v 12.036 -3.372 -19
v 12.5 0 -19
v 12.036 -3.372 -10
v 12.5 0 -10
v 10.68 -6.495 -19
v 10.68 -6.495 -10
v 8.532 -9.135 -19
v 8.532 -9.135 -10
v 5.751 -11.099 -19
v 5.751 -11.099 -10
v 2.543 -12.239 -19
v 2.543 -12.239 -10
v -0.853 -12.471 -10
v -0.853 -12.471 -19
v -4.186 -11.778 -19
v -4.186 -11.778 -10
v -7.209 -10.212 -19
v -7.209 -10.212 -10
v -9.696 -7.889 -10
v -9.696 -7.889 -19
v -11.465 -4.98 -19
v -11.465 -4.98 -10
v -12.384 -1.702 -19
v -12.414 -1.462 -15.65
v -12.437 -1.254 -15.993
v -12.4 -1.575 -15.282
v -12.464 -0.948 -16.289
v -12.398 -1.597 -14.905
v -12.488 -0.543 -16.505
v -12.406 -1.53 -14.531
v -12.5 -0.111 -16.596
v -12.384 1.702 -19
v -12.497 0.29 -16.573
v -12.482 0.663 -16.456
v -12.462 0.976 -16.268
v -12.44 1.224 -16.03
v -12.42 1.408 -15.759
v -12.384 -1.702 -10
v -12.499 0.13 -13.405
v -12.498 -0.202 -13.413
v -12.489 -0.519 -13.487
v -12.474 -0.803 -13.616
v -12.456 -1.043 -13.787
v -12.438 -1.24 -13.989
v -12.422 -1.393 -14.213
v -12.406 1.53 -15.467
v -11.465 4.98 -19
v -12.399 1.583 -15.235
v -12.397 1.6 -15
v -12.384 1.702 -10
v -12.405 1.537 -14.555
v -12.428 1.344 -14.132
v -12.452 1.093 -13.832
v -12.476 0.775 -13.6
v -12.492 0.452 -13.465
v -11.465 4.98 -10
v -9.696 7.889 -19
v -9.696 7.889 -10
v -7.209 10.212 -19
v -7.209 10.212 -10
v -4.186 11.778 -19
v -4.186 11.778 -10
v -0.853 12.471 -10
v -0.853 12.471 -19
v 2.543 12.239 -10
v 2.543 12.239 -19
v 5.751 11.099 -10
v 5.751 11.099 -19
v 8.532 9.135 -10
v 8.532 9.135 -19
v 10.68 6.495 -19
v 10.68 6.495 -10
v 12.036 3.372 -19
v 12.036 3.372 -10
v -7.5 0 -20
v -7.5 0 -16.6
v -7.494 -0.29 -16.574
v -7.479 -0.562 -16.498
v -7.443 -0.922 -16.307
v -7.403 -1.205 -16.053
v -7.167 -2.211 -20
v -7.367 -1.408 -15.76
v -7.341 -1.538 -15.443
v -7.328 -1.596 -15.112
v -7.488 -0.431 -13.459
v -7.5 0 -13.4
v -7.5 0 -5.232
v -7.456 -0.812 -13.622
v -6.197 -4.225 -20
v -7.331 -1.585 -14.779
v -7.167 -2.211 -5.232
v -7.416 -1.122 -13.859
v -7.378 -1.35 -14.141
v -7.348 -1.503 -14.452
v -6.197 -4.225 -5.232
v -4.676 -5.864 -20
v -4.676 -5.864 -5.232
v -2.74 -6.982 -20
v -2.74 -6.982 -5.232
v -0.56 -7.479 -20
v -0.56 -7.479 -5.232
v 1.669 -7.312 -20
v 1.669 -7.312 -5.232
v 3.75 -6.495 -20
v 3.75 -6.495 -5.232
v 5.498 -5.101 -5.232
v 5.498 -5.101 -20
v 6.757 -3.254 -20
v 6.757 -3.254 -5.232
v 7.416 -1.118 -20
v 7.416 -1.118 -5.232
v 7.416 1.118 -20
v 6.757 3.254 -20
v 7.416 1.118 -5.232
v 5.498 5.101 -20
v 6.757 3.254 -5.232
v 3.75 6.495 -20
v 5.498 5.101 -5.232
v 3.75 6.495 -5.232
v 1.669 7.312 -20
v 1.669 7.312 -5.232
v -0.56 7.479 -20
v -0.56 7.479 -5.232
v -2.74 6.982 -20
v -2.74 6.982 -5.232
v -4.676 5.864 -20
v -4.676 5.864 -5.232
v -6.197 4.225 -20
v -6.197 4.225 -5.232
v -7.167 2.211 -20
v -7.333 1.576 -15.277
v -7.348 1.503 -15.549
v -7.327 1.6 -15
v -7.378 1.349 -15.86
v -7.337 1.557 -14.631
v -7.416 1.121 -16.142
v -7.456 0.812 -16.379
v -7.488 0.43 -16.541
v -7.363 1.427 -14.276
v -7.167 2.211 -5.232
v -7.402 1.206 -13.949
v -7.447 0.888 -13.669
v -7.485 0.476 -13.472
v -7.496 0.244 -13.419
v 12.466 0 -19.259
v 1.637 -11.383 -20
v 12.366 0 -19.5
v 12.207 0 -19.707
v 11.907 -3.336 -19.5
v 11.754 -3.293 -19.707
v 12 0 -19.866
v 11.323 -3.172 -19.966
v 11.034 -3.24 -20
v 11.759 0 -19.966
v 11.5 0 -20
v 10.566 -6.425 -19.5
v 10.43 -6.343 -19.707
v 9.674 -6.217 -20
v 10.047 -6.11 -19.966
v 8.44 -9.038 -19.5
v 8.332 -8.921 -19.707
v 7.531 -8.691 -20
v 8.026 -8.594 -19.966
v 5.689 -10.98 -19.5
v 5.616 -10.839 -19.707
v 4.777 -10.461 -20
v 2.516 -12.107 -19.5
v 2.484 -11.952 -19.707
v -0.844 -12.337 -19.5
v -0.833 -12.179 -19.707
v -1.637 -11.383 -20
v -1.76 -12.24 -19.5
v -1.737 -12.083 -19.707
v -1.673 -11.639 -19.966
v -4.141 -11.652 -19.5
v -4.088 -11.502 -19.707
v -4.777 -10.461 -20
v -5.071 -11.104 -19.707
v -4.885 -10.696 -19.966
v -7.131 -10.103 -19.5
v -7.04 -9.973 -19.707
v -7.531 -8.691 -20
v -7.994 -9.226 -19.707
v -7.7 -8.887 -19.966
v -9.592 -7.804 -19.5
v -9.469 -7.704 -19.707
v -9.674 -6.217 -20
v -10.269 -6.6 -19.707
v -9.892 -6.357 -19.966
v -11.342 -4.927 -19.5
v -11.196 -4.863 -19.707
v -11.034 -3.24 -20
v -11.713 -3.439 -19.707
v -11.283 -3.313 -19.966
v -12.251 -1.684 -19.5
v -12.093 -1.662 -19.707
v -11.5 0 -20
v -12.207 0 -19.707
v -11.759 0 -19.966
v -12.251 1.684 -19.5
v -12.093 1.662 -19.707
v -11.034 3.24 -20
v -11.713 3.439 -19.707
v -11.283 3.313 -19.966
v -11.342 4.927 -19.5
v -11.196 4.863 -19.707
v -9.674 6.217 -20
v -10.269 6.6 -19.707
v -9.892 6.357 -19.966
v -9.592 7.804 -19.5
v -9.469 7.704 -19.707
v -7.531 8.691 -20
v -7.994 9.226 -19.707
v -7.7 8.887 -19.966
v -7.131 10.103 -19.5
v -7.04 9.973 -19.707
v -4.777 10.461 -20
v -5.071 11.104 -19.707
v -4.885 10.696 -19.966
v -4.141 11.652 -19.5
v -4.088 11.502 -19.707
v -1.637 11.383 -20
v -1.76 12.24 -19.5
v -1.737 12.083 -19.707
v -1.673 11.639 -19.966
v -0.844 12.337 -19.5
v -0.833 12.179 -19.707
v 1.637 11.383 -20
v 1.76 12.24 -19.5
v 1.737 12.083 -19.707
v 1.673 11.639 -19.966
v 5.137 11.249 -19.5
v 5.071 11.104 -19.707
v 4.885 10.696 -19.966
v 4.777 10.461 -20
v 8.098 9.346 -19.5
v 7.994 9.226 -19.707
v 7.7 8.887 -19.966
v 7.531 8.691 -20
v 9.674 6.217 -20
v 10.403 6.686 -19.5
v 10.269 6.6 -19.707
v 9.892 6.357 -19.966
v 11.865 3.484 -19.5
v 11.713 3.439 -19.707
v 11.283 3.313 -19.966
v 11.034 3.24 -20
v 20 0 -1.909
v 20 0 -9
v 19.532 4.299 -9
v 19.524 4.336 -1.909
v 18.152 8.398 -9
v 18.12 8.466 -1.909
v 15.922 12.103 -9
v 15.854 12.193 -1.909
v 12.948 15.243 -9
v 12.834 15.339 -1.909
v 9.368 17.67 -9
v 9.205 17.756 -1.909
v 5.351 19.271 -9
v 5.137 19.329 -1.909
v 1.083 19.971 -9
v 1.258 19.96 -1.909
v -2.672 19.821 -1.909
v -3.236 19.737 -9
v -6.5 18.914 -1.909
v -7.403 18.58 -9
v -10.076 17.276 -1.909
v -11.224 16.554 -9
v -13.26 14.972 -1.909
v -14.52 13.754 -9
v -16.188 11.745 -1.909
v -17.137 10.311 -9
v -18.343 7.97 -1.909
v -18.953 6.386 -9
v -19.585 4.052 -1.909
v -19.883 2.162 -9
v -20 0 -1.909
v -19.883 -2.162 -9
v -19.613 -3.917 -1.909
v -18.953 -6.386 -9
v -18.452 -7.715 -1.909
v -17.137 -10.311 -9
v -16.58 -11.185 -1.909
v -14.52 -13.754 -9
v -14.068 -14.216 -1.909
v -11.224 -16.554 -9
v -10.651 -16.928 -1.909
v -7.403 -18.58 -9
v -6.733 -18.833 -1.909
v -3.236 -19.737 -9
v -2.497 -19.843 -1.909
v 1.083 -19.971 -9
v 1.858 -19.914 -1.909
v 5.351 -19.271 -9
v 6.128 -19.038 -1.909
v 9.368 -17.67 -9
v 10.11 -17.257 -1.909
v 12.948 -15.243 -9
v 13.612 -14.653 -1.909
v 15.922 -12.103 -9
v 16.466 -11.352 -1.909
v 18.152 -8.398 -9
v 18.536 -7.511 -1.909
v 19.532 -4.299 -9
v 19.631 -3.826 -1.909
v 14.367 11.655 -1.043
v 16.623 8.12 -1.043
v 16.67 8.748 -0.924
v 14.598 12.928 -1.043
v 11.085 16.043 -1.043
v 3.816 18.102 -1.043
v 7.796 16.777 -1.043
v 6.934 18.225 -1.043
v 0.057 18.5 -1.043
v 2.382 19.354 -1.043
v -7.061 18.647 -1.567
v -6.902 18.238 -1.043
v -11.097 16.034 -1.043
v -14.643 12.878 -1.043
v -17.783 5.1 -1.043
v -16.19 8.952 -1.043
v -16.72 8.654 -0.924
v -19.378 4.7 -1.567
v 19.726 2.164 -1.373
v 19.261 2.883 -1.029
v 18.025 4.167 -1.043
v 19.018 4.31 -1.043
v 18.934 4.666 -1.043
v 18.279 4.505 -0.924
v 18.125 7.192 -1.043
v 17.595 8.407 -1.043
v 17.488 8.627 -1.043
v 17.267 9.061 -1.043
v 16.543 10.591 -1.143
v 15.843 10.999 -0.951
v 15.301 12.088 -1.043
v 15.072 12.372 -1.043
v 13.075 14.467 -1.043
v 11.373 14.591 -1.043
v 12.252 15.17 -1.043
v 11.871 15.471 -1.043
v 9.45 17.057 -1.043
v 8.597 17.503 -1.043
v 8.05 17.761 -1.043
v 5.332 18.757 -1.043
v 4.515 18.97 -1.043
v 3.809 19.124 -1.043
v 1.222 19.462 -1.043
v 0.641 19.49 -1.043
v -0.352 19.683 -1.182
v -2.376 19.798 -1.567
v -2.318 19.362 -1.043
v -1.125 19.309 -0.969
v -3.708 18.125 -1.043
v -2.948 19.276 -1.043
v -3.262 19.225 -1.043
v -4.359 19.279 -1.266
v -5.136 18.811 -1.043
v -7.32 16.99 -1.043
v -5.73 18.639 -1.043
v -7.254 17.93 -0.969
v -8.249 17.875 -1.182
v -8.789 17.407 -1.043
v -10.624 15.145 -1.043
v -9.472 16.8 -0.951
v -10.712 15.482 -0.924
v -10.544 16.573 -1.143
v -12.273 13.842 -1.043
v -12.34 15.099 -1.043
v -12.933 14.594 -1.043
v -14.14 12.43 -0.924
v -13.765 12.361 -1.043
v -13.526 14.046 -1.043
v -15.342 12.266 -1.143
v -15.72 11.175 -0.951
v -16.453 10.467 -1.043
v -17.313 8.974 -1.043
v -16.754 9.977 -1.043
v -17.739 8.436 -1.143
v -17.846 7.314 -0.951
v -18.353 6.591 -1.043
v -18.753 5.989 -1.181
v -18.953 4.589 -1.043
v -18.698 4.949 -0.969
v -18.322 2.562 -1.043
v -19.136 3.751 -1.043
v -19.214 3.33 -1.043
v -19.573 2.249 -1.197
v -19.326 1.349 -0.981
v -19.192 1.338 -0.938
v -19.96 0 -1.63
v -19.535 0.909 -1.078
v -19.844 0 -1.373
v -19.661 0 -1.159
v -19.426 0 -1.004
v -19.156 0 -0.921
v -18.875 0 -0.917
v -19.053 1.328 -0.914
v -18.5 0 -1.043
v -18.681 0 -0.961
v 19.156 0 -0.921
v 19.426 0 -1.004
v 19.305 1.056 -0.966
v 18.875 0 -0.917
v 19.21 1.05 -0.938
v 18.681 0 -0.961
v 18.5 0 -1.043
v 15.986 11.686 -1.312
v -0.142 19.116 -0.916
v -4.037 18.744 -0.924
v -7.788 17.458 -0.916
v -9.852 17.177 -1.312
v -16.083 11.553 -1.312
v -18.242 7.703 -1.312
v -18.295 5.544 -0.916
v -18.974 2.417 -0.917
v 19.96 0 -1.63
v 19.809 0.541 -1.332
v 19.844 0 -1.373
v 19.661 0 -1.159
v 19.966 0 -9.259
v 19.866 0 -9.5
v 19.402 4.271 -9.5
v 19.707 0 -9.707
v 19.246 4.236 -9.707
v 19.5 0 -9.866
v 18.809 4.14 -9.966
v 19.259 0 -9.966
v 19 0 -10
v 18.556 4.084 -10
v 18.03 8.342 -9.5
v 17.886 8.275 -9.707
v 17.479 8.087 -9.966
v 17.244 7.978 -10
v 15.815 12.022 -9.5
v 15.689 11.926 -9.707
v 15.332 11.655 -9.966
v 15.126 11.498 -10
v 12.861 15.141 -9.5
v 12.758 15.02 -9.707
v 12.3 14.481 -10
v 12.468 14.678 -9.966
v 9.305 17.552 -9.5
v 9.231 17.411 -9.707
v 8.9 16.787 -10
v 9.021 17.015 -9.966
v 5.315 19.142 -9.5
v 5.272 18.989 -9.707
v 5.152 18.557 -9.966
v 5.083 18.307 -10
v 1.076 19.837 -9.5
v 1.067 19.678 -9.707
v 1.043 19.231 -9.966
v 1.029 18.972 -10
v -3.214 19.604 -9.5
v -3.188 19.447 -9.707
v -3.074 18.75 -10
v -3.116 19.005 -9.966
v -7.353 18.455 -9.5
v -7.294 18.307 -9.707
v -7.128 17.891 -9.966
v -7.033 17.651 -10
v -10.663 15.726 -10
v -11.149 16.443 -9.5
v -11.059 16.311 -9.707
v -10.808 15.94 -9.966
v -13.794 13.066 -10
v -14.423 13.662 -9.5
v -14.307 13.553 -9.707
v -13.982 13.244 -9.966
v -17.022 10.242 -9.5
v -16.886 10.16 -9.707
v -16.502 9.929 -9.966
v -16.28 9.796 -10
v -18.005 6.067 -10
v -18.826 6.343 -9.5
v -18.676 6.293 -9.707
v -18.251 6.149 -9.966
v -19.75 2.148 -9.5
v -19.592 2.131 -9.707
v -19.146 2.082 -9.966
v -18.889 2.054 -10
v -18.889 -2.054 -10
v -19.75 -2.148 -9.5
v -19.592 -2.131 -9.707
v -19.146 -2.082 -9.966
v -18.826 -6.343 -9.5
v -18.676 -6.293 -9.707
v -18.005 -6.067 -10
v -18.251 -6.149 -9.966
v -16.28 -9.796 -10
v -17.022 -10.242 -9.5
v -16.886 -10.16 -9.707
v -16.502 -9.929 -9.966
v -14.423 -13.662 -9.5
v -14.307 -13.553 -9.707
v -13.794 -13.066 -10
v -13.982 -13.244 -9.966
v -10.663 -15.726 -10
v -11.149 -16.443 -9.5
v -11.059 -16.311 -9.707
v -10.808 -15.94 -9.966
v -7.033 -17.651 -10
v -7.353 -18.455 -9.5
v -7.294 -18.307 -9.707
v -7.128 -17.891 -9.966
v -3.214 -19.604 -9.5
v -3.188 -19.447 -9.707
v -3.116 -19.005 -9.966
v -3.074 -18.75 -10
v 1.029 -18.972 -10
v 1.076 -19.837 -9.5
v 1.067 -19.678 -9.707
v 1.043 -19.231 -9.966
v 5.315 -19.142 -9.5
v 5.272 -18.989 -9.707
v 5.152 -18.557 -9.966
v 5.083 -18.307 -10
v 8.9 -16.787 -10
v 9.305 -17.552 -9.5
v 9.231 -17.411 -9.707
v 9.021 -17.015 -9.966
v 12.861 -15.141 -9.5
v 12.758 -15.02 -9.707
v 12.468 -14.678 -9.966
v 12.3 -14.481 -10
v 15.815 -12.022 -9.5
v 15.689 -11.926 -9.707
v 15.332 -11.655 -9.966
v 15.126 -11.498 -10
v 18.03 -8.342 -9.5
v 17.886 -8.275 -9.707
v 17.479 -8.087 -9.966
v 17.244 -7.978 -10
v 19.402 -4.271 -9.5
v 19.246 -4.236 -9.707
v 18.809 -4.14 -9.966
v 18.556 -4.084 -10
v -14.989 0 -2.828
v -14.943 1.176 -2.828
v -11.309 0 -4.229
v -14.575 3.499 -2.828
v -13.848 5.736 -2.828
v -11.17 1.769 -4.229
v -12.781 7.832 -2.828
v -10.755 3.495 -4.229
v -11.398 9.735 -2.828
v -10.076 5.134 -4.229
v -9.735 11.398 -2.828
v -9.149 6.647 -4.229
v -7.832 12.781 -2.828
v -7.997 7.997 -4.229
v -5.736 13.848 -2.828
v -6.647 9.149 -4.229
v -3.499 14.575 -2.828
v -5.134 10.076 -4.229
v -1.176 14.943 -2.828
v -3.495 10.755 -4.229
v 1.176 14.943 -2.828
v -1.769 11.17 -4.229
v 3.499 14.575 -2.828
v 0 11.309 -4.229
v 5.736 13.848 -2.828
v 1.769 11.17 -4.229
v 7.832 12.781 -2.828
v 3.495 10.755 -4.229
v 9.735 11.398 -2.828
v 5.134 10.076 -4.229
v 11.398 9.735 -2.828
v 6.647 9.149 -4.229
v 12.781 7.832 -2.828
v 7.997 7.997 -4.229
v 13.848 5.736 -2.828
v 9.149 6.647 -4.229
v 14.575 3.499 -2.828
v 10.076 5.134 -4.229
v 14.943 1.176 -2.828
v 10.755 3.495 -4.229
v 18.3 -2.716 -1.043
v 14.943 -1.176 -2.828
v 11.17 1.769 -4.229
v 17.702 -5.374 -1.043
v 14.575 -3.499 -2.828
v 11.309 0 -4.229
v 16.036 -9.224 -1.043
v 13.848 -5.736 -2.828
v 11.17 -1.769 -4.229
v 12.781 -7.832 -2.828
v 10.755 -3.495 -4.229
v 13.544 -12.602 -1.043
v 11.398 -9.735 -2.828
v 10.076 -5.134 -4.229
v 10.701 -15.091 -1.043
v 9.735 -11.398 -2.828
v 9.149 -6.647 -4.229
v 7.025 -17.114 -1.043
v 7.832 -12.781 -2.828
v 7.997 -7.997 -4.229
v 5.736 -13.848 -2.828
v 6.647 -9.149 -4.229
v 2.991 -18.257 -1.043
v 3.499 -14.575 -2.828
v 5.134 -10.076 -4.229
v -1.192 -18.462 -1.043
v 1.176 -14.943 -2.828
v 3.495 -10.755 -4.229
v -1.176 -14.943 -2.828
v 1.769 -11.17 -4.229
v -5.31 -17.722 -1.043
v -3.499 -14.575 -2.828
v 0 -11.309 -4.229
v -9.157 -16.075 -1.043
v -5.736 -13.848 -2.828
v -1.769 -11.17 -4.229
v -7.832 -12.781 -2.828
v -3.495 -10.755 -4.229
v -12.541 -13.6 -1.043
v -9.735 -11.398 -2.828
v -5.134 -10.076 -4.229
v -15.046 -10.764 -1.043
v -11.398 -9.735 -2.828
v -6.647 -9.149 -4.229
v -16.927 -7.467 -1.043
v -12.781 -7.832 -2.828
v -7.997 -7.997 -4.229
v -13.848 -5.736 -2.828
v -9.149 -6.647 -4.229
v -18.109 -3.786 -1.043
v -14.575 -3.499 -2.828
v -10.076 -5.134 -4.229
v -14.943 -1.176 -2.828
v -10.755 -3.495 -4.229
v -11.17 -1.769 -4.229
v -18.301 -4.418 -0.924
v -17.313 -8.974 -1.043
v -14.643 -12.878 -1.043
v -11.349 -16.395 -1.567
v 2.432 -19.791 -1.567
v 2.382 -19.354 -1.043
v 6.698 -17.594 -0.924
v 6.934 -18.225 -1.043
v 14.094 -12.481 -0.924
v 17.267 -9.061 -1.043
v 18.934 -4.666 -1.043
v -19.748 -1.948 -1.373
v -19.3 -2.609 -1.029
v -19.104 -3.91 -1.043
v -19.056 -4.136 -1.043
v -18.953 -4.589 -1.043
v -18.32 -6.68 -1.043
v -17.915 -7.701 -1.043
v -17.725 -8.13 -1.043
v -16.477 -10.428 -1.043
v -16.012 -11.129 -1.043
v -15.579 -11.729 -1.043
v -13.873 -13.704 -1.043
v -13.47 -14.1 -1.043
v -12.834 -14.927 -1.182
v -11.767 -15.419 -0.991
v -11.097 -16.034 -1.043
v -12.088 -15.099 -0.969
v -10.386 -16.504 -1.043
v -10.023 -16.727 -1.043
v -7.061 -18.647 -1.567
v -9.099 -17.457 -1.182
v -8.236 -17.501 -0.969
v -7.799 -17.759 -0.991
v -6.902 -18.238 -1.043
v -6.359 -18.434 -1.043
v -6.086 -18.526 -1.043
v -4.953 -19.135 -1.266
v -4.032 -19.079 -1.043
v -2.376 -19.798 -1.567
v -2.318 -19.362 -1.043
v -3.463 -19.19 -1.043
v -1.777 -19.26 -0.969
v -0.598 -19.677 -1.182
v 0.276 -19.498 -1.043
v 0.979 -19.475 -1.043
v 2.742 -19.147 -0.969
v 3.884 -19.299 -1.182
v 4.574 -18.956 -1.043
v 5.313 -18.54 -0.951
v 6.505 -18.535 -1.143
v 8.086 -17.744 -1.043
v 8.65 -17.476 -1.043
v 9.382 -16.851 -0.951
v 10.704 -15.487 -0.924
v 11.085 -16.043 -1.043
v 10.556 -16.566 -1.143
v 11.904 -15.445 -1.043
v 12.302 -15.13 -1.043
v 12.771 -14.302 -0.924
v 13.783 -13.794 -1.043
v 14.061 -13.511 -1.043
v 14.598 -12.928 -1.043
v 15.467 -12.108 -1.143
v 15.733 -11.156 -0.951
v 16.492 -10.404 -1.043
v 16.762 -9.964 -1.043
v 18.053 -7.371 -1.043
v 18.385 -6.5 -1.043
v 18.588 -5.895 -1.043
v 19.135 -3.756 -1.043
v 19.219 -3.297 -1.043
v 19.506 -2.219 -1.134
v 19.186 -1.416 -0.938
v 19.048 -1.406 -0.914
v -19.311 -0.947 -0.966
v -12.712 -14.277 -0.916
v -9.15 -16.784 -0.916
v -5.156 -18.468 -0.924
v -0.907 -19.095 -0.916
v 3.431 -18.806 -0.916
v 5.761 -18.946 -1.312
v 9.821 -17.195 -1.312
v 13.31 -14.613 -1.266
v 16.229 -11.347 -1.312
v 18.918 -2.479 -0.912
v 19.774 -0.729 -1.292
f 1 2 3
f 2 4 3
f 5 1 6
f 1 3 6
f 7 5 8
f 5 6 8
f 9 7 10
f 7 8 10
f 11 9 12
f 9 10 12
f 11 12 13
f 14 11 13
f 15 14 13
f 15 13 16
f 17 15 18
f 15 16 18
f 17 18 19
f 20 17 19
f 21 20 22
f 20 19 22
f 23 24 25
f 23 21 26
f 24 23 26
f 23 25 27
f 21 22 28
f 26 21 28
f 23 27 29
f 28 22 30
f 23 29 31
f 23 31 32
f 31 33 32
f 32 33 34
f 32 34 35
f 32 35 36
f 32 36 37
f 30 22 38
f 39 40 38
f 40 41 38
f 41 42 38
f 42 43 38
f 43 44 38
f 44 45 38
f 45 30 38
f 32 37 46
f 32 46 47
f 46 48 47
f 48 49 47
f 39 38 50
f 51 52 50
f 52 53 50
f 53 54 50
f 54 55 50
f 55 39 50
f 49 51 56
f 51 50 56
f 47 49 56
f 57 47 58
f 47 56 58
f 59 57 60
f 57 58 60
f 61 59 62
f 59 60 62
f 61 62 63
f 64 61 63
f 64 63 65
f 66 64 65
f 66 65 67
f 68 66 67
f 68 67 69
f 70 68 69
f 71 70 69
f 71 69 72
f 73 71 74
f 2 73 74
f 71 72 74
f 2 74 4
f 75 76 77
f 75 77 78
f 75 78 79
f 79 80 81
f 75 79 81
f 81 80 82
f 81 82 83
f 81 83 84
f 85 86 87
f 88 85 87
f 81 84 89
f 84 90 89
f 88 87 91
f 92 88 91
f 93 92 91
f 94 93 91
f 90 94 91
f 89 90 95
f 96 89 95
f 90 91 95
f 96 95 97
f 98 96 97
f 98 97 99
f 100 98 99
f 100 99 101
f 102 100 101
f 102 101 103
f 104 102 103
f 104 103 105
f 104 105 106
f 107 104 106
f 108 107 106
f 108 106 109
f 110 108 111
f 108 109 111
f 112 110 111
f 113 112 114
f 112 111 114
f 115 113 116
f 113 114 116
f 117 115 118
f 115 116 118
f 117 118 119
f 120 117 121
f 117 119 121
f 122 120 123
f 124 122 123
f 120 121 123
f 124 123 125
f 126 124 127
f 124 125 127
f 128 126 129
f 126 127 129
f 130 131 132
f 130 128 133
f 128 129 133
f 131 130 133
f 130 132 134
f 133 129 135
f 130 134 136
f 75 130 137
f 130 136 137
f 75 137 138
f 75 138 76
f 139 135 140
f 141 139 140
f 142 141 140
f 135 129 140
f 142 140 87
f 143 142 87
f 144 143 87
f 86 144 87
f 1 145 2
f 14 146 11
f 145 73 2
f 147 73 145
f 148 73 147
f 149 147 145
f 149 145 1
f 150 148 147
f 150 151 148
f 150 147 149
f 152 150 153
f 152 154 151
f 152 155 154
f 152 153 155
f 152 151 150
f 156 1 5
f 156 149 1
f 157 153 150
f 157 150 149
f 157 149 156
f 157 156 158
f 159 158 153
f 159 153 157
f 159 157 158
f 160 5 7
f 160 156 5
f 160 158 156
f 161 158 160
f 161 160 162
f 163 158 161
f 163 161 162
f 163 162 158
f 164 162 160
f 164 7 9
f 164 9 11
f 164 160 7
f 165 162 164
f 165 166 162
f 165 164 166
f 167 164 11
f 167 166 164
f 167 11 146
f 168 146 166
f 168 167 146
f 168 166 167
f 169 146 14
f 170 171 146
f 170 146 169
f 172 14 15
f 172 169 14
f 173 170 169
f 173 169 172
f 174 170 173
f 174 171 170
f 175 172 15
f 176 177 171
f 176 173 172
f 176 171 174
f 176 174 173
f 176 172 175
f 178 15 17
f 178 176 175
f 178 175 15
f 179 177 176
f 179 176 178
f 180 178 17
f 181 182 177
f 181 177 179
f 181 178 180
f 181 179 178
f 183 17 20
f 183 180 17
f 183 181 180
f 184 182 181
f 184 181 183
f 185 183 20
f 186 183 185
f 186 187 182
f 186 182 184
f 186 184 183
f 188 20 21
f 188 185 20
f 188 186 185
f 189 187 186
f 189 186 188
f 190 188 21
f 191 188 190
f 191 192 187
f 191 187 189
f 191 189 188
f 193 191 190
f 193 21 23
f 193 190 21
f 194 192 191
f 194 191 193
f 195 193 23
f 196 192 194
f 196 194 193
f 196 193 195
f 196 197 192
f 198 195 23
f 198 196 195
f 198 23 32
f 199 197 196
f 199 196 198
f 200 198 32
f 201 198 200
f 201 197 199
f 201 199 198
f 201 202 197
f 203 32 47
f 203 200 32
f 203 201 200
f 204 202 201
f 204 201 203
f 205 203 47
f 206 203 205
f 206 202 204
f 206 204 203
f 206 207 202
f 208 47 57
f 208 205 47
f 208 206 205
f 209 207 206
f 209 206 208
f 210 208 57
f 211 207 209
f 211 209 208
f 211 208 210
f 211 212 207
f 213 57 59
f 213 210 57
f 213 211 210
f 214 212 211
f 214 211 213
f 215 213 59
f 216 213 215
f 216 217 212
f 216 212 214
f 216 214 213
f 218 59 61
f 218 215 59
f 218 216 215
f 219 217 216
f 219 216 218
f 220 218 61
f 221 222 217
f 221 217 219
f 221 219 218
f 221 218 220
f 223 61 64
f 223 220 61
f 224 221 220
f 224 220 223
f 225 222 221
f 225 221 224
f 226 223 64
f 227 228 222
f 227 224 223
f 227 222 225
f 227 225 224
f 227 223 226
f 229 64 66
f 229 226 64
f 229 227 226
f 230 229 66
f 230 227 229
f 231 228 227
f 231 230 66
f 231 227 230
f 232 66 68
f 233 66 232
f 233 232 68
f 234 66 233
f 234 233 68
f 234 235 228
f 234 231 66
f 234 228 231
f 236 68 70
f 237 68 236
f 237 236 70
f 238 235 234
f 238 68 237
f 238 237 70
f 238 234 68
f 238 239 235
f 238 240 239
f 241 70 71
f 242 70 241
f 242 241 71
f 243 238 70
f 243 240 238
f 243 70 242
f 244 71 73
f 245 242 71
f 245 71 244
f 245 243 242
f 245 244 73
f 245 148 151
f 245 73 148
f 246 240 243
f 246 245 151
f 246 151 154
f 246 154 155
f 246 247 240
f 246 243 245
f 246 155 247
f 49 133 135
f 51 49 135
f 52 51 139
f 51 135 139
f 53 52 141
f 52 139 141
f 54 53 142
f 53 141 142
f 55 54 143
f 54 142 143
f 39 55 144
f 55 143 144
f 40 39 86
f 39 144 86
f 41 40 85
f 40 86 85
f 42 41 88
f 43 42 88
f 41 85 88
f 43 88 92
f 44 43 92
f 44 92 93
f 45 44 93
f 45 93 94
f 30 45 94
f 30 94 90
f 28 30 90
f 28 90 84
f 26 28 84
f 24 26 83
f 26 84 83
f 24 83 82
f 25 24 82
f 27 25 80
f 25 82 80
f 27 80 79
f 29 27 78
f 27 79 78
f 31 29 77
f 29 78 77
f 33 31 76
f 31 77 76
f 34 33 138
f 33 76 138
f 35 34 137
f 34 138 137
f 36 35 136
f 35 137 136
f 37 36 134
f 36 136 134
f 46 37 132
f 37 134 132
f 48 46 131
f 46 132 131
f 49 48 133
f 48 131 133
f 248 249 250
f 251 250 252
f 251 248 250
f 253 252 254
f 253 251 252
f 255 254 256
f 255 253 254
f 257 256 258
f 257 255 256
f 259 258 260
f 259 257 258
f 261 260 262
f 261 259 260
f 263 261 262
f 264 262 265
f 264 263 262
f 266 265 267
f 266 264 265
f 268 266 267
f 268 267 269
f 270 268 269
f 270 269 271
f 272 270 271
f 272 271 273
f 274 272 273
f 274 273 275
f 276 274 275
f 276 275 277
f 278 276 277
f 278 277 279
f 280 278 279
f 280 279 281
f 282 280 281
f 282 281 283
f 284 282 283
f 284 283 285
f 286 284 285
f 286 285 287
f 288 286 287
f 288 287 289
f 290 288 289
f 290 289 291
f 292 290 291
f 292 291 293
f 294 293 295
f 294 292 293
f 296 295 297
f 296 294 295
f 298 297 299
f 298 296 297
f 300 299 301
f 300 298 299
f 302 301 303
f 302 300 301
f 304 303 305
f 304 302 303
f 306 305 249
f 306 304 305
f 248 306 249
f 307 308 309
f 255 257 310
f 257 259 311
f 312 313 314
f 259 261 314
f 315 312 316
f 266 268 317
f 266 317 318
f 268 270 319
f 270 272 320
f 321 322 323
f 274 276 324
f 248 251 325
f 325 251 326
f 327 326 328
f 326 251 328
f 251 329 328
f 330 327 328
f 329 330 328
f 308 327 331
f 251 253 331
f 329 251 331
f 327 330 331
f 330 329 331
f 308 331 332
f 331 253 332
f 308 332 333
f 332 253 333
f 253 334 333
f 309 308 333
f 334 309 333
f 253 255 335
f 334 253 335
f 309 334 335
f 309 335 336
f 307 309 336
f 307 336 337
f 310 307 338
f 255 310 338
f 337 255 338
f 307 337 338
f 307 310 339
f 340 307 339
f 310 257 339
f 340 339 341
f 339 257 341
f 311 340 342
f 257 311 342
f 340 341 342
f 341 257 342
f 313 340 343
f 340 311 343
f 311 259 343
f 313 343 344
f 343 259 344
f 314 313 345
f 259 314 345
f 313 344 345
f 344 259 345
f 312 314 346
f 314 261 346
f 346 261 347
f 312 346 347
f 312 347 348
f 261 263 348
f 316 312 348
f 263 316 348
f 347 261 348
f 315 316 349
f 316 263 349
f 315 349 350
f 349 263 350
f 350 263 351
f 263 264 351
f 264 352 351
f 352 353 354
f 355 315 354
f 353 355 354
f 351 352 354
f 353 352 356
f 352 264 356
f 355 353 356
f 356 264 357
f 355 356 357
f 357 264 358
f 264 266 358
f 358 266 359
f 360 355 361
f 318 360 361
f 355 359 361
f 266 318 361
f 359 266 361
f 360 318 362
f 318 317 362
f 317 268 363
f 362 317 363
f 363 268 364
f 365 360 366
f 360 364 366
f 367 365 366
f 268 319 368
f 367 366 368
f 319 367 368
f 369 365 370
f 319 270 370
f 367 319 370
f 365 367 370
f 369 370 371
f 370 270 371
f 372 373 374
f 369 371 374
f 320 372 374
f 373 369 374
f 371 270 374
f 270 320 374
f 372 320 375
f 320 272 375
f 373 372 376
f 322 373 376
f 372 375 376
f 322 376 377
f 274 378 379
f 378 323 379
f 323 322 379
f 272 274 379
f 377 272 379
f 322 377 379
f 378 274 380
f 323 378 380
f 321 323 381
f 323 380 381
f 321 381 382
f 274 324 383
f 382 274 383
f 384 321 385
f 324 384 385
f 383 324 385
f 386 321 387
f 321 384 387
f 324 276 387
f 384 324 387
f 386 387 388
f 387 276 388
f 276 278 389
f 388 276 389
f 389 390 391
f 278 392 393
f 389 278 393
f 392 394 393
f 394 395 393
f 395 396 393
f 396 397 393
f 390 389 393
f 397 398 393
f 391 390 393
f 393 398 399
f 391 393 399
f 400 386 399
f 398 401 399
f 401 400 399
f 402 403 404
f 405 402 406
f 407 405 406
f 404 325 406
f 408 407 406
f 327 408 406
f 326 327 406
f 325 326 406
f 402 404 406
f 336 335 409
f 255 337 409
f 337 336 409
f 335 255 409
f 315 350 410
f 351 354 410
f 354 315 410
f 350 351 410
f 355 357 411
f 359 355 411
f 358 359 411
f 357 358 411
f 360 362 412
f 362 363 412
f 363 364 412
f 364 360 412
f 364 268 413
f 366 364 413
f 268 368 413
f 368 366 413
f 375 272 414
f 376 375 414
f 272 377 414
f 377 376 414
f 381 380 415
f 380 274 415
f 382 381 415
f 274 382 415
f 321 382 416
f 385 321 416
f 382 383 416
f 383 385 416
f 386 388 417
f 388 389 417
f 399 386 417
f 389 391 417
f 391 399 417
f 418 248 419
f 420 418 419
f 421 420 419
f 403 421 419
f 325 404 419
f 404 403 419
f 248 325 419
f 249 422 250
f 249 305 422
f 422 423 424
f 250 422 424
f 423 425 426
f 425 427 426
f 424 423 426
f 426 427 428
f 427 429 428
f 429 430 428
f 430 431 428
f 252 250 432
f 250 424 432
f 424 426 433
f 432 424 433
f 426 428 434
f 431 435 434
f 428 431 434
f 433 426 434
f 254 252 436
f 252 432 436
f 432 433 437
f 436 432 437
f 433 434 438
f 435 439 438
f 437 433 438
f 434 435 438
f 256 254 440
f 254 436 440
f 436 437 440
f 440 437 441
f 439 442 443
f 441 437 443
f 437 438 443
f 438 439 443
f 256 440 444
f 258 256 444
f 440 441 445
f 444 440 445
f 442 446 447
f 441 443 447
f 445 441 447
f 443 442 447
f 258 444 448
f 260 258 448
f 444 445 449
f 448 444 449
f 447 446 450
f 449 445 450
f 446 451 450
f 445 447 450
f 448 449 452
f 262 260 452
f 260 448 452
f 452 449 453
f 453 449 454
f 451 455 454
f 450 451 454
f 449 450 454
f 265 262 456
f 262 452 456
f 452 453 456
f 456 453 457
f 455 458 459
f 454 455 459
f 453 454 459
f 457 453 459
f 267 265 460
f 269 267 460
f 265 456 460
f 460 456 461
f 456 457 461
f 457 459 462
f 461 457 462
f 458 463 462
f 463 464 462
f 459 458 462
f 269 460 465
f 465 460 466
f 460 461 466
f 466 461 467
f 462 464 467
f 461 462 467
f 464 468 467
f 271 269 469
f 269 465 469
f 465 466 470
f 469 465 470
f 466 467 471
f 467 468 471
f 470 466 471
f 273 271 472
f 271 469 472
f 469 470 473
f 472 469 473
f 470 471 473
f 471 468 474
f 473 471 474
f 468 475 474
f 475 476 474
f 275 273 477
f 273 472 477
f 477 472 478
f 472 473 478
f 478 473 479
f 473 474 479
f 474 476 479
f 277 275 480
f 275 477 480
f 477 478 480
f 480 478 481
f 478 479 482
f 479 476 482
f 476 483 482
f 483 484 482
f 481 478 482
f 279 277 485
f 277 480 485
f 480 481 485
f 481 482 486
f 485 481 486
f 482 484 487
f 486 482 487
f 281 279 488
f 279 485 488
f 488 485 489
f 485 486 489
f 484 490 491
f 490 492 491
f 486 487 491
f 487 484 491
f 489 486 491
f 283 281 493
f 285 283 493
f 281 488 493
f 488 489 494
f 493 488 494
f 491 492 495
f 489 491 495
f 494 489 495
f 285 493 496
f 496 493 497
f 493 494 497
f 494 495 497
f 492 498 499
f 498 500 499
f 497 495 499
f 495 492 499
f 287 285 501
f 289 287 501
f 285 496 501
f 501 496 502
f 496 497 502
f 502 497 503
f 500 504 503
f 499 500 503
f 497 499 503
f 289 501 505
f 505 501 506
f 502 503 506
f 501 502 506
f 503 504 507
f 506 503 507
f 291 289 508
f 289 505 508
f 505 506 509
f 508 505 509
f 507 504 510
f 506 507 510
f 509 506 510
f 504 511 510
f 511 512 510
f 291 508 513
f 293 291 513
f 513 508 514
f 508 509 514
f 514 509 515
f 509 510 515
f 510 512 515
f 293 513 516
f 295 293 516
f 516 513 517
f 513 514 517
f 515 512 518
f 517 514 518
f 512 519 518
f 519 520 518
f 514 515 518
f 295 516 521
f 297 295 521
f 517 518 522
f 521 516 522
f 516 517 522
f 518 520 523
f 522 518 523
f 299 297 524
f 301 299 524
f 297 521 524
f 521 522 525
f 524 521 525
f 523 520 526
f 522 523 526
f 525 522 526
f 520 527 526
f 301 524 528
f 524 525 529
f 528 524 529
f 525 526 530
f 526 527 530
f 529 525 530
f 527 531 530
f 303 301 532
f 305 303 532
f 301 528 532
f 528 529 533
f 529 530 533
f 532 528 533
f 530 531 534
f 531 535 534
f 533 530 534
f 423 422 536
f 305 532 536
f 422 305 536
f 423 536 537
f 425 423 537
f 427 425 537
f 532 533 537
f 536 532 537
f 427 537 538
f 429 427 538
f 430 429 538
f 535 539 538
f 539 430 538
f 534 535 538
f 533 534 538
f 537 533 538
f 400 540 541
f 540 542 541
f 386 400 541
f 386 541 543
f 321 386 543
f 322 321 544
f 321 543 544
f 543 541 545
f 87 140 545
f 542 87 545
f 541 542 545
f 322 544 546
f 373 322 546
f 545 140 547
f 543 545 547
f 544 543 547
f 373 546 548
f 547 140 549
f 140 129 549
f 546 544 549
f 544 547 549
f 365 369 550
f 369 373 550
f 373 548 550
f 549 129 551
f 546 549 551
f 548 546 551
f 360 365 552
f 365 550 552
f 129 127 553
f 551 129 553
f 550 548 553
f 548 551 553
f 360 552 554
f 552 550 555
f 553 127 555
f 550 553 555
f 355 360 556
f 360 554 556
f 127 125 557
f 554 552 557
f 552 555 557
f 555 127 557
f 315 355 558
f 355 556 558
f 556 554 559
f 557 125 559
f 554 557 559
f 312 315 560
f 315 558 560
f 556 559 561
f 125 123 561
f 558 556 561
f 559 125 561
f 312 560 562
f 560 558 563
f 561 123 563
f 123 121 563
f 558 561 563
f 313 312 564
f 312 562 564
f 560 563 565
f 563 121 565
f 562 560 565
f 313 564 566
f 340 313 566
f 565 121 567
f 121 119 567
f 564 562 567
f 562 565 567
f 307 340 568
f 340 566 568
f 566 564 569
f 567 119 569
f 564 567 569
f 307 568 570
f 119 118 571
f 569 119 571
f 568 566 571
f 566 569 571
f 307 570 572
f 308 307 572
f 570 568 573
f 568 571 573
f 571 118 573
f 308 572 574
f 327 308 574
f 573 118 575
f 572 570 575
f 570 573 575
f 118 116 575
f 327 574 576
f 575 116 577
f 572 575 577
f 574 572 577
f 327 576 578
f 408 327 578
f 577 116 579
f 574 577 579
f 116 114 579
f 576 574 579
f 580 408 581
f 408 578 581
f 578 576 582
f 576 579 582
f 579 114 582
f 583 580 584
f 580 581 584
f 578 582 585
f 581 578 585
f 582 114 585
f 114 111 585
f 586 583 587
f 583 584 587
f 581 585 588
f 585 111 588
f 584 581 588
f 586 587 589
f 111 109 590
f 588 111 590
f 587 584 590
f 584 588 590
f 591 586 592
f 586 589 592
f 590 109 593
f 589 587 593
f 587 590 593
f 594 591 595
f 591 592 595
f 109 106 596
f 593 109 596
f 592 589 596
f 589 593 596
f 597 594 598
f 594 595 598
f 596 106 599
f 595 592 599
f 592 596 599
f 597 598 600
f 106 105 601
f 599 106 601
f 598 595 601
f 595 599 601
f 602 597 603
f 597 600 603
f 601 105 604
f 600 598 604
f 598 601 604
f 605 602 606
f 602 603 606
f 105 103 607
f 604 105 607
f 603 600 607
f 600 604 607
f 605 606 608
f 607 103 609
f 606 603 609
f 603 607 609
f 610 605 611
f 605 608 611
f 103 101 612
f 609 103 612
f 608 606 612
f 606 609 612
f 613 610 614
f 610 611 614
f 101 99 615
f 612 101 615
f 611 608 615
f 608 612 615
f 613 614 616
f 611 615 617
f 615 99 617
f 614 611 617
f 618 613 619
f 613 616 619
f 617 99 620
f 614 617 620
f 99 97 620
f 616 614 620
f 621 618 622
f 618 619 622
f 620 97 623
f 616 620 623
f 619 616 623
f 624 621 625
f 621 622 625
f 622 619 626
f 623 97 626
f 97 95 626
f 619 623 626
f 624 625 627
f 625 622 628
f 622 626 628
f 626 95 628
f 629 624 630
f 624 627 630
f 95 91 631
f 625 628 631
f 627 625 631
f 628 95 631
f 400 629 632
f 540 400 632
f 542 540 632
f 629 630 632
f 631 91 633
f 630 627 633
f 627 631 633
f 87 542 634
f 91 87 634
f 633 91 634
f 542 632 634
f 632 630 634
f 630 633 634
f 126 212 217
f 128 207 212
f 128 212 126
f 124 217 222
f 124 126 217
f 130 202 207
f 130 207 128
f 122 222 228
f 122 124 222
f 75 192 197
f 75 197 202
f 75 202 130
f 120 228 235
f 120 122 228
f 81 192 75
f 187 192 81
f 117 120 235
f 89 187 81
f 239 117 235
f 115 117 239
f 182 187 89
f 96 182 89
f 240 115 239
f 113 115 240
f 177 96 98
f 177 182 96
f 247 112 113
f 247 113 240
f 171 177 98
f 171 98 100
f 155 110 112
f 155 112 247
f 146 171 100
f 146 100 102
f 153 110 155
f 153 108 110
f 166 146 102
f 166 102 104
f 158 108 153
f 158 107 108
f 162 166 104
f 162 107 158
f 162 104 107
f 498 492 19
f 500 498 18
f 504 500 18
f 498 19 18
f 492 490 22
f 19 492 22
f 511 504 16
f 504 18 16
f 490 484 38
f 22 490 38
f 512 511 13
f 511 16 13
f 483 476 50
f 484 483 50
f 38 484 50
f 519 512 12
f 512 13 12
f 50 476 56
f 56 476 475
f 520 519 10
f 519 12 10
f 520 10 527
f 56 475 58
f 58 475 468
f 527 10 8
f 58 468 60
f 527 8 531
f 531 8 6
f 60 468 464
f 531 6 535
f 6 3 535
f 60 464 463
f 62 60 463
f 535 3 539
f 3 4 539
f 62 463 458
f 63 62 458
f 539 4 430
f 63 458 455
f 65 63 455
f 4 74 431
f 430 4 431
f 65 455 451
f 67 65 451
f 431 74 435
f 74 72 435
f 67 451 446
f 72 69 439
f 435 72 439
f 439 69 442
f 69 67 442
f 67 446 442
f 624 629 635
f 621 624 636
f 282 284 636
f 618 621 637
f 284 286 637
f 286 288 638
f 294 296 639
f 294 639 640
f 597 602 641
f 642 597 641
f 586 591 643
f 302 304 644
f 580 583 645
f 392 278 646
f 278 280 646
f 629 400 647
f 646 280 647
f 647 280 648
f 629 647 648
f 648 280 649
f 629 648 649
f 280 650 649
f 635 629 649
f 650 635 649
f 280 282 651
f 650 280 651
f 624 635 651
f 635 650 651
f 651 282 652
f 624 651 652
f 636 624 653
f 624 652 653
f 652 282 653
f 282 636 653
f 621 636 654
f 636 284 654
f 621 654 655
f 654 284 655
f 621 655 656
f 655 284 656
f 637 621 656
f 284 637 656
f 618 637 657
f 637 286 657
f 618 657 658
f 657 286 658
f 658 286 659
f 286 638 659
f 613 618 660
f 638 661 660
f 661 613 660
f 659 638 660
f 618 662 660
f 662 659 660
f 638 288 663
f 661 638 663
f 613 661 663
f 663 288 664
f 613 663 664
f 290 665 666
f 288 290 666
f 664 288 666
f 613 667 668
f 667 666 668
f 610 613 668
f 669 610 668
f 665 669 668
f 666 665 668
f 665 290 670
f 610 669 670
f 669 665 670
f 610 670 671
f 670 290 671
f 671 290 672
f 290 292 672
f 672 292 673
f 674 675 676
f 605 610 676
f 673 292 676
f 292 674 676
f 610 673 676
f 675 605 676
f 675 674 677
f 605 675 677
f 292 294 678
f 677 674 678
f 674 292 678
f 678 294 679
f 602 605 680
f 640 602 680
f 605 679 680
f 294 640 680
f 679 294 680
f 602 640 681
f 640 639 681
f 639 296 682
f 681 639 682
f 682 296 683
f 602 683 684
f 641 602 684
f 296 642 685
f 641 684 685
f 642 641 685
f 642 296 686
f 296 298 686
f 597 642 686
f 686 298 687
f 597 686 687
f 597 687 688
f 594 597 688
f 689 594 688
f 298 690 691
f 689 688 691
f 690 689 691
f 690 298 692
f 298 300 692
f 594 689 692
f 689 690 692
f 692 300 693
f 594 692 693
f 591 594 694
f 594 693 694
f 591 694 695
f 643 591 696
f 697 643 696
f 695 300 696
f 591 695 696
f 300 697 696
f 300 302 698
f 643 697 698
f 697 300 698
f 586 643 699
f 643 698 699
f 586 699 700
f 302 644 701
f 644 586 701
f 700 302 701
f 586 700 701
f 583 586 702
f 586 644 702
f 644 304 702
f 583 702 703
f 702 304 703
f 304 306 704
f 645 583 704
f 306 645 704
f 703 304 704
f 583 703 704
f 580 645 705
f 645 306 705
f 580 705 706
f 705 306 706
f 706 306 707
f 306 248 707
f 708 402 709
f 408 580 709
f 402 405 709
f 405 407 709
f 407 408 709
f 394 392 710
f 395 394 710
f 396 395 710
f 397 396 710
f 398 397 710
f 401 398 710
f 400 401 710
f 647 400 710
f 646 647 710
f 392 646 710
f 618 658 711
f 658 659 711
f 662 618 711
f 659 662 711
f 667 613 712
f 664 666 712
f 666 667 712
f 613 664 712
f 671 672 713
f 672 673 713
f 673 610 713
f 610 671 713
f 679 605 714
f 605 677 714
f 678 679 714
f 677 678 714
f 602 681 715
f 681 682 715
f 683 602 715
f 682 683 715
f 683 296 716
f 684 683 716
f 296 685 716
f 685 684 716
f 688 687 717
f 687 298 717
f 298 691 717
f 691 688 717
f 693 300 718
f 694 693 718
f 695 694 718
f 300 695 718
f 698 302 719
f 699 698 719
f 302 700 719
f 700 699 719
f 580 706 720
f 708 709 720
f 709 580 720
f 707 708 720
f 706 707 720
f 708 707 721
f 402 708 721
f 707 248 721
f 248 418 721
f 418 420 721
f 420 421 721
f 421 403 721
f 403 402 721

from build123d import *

# Parameters (mm, degrees)
F0_R      = 20
F1_DEPTH  = 10
F4_R      = 12.5
F5_DEPTH  = 10
F6_R      = 1
F8_D      = 15
F10_D     = 3.2
F10_DEPTH = 20.0010001


with BuildPart() as f1:
    # F0 (on Top) → F1 (new body)
    with BuildSketch(Plane.XY):
        Circle(F0_R)
    extrude(amount=-F1_DEPTH)

    # F2 (on Front) → F3 (revolve, cut)
    with BuildSketch(Plane.XZ):
        with BuildLine():
            Line((0, -6), (0, 68))
            ThreePointArc((0, 68), (-37, 31), (0, -6))
        make_face()
    revolve(axis=Axis((0, 0, 31), (0, 0, -1)), mode=Mode.SUBTRACT)

    # F4 (on face) → F5 (join)
    with BuildSketch(Plane(origin=(0, 0, -10), x_dir=(1, 0, 0), z_dir=(0, 0, -1))):
        Circle(F4_R)
    extrude(amount=F5_DEPTH)

    # F6
    f6_edges = [f1.edges().sort_by_distance(p)[0] for p in [
        (0, 20, -0.128765),
        (0, -20, -0.128765),
        (-20, 0, -10),
        (-12.5, 0, -20),
    ]]
    fillet(f6_edges, radius=F6_R)

    # F8 (through all)
    with Locations(Plane(origin=(0, 0, -20), x_dir=(1, 0, 0), z_dir=(0, 0, -1))):
        with Locations((0, 0)):
            Hole(F8_D / 2)

    # F10 (through all, one way)
    with BuildSketch(Plane.YZ):
        with Locations((0, -15)):
            Circle(F10_D / 2)
    extrude(amount=-F10_DEPTH, mode=Mode.SUBTRACT)


solid = f1.part
